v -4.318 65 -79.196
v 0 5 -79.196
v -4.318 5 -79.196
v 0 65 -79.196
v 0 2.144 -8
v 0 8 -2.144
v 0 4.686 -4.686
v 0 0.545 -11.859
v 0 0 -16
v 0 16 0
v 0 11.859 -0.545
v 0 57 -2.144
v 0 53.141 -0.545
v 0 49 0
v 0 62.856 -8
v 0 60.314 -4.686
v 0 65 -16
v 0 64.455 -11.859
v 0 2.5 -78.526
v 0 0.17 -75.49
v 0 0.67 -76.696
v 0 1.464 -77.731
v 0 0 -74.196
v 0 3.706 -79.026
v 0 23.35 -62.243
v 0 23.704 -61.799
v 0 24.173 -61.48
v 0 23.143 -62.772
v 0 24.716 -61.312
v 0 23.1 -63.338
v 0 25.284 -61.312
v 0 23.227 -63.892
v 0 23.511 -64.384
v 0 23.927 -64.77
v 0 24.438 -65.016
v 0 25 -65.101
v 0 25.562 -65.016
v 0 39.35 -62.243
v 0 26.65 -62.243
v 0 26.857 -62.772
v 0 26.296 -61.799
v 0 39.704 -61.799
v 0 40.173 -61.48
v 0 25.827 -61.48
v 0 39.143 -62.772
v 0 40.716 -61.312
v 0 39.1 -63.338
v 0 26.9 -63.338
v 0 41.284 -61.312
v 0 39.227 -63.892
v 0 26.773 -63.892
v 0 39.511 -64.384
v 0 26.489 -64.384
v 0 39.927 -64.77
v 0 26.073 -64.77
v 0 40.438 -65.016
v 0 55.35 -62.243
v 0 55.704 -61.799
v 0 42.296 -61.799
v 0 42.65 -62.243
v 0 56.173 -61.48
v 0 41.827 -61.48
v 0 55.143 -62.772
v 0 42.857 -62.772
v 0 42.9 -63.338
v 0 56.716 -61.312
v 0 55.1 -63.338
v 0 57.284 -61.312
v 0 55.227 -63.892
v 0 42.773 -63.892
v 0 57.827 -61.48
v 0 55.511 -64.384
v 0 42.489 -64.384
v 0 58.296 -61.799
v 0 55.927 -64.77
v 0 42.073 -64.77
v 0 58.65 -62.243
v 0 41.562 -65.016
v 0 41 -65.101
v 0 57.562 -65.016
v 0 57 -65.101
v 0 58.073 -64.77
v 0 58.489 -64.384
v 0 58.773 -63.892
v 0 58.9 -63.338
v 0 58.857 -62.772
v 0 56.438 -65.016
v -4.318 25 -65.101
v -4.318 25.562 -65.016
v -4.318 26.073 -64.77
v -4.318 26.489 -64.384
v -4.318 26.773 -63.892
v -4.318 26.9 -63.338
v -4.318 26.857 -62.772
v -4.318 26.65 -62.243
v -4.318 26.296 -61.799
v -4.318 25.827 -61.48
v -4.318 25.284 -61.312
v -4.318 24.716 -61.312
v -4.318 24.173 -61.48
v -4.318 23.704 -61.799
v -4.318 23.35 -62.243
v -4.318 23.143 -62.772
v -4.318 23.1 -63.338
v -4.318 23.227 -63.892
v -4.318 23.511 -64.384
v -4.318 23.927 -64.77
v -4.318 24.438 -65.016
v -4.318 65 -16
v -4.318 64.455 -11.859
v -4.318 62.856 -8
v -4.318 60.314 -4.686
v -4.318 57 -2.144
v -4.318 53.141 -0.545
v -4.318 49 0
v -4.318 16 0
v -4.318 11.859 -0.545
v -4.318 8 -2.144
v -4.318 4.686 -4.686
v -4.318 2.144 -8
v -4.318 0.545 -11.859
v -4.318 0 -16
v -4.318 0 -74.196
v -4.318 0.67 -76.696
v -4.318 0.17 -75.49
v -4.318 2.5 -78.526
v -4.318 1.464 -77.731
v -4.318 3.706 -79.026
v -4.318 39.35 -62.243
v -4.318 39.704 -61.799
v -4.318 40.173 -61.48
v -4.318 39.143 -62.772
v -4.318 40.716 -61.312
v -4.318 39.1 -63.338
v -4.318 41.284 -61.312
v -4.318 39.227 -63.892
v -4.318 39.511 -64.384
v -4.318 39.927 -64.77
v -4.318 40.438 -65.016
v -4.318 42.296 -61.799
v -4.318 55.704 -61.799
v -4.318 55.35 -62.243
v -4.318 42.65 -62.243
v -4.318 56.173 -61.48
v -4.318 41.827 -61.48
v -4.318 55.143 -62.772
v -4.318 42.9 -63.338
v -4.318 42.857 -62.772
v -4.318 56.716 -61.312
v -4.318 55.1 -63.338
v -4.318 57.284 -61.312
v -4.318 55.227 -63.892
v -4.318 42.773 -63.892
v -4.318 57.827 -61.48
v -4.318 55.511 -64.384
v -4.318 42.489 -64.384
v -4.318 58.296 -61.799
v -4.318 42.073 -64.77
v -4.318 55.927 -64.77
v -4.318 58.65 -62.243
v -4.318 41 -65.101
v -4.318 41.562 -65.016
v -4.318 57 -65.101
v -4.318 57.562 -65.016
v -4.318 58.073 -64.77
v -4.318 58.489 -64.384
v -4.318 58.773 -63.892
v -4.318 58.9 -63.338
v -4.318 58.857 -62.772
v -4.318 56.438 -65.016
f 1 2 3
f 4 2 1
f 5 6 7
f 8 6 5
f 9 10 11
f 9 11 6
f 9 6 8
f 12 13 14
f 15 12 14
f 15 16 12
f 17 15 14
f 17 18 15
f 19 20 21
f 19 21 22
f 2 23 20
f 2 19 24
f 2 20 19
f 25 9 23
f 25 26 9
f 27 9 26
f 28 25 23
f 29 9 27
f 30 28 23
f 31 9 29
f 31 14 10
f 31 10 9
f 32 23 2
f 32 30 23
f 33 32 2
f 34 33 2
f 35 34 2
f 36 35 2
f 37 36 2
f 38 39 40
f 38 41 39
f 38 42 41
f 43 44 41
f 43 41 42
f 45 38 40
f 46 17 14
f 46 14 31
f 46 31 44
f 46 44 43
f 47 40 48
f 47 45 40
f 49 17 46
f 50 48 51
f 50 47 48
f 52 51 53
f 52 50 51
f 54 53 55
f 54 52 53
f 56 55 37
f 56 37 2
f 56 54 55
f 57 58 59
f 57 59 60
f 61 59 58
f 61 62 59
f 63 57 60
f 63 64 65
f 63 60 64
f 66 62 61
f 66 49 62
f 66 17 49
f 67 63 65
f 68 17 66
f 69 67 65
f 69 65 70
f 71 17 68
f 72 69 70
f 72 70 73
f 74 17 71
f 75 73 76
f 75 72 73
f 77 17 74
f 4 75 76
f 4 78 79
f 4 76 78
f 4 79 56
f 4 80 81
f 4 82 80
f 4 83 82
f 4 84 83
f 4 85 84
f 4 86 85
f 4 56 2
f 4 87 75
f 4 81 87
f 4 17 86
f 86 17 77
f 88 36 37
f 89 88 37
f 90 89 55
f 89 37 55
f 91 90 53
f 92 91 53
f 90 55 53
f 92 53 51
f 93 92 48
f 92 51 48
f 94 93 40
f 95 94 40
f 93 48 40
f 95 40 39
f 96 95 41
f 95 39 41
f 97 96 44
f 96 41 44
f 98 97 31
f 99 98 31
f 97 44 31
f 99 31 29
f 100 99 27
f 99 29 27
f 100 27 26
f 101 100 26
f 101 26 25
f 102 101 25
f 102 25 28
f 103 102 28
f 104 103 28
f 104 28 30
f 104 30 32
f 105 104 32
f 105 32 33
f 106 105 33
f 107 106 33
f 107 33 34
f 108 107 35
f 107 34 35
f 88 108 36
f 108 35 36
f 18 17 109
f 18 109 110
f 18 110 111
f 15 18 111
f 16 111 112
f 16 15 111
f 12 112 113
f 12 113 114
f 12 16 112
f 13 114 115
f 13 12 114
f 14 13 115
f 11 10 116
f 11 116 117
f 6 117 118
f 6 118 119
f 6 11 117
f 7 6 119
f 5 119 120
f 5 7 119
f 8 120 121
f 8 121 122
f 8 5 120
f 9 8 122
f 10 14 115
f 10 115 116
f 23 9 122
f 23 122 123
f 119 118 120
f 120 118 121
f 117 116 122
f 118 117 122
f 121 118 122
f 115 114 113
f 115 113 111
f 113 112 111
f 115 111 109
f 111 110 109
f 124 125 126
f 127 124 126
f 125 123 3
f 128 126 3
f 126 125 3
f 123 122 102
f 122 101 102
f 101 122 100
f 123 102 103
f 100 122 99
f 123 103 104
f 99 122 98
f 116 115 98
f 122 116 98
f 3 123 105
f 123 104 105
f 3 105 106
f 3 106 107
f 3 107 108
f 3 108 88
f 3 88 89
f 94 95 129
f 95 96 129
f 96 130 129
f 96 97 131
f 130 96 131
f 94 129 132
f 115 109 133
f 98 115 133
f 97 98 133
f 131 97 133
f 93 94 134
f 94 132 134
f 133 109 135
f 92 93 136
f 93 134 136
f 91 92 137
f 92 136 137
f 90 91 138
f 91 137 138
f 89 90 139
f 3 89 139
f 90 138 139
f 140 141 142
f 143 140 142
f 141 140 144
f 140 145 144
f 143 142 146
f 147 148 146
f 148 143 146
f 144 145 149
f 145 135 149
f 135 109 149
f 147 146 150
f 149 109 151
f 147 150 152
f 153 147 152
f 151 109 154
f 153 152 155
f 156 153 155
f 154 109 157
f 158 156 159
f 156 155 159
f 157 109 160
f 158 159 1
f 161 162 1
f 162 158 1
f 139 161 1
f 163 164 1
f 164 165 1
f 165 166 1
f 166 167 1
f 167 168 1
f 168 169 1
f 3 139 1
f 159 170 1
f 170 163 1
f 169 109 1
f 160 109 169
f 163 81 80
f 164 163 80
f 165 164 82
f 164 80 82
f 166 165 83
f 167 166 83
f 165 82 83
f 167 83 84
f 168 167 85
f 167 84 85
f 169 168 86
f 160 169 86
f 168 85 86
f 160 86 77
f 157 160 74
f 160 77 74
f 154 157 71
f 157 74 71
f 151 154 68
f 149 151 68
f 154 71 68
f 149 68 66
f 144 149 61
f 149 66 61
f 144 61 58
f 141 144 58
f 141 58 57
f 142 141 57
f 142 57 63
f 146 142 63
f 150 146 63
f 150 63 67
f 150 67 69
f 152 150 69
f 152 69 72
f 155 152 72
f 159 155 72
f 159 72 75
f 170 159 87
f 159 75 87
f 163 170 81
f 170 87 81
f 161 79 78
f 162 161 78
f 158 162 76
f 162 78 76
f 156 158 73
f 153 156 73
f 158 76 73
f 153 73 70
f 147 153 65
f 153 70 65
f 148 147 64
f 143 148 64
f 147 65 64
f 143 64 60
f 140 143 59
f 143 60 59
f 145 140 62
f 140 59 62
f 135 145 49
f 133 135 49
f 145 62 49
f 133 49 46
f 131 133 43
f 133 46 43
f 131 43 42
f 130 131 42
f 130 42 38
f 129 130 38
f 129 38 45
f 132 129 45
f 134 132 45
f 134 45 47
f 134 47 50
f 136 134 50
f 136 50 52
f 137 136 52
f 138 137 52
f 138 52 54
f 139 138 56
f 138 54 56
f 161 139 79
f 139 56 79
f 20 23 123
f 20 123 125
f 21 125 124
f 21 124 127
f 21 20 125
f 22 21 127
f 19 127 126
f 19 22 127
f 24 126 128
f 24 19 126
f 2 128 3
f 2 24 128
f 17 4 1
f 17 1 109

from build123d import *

# Parameters (mm, degrees)
SKETCH1_R           = 1.905
BOSS_EXTRUDE1_DEPTH = 4.318


with BuildPart() as part:
    # Sketch1 → Boss-Extrude1 (new body)
    with BuildSketch(Plane(origin=(0, 0, 0), x_dir=(0, 0, -1), z_dir=(1, 0, 0))):
        with BuildLine():
            Line((16, 0), (74.195959493, 0))
            ThreePointArc((74.195959493, 0), (77.731493399, 1.464466094), (79.195959493, 5))
            Line((79.195959493, 5), (79.195959493, 65))
            Line((79.195959493, 65), (16, 65))
            ThreePointArc((16, 65), (4.686291501, 60.313708499), (0, 49))
            Line((0, 49), (0, 16))
            ThreePointArc((0, 16), (4.686291501, 4.686291501), (16, 0))
        make_face()
        with Locations((63.195959493, 57)):
            Circle(SKETCH1_R, mode=Mode.SUBTRACT)
        with Locations((63.195959493, 41)):
            Circle(SKETCH1_R, mode=Mode.SUBTRACT)
        with Locations((63.195959493, 25)):
            Circle(SKETCH1_R, mode=Mode.SUBTRACT)
    extrude(amount=-BOSS_EXTRUDE1_DEPTH)


solid = part.part
